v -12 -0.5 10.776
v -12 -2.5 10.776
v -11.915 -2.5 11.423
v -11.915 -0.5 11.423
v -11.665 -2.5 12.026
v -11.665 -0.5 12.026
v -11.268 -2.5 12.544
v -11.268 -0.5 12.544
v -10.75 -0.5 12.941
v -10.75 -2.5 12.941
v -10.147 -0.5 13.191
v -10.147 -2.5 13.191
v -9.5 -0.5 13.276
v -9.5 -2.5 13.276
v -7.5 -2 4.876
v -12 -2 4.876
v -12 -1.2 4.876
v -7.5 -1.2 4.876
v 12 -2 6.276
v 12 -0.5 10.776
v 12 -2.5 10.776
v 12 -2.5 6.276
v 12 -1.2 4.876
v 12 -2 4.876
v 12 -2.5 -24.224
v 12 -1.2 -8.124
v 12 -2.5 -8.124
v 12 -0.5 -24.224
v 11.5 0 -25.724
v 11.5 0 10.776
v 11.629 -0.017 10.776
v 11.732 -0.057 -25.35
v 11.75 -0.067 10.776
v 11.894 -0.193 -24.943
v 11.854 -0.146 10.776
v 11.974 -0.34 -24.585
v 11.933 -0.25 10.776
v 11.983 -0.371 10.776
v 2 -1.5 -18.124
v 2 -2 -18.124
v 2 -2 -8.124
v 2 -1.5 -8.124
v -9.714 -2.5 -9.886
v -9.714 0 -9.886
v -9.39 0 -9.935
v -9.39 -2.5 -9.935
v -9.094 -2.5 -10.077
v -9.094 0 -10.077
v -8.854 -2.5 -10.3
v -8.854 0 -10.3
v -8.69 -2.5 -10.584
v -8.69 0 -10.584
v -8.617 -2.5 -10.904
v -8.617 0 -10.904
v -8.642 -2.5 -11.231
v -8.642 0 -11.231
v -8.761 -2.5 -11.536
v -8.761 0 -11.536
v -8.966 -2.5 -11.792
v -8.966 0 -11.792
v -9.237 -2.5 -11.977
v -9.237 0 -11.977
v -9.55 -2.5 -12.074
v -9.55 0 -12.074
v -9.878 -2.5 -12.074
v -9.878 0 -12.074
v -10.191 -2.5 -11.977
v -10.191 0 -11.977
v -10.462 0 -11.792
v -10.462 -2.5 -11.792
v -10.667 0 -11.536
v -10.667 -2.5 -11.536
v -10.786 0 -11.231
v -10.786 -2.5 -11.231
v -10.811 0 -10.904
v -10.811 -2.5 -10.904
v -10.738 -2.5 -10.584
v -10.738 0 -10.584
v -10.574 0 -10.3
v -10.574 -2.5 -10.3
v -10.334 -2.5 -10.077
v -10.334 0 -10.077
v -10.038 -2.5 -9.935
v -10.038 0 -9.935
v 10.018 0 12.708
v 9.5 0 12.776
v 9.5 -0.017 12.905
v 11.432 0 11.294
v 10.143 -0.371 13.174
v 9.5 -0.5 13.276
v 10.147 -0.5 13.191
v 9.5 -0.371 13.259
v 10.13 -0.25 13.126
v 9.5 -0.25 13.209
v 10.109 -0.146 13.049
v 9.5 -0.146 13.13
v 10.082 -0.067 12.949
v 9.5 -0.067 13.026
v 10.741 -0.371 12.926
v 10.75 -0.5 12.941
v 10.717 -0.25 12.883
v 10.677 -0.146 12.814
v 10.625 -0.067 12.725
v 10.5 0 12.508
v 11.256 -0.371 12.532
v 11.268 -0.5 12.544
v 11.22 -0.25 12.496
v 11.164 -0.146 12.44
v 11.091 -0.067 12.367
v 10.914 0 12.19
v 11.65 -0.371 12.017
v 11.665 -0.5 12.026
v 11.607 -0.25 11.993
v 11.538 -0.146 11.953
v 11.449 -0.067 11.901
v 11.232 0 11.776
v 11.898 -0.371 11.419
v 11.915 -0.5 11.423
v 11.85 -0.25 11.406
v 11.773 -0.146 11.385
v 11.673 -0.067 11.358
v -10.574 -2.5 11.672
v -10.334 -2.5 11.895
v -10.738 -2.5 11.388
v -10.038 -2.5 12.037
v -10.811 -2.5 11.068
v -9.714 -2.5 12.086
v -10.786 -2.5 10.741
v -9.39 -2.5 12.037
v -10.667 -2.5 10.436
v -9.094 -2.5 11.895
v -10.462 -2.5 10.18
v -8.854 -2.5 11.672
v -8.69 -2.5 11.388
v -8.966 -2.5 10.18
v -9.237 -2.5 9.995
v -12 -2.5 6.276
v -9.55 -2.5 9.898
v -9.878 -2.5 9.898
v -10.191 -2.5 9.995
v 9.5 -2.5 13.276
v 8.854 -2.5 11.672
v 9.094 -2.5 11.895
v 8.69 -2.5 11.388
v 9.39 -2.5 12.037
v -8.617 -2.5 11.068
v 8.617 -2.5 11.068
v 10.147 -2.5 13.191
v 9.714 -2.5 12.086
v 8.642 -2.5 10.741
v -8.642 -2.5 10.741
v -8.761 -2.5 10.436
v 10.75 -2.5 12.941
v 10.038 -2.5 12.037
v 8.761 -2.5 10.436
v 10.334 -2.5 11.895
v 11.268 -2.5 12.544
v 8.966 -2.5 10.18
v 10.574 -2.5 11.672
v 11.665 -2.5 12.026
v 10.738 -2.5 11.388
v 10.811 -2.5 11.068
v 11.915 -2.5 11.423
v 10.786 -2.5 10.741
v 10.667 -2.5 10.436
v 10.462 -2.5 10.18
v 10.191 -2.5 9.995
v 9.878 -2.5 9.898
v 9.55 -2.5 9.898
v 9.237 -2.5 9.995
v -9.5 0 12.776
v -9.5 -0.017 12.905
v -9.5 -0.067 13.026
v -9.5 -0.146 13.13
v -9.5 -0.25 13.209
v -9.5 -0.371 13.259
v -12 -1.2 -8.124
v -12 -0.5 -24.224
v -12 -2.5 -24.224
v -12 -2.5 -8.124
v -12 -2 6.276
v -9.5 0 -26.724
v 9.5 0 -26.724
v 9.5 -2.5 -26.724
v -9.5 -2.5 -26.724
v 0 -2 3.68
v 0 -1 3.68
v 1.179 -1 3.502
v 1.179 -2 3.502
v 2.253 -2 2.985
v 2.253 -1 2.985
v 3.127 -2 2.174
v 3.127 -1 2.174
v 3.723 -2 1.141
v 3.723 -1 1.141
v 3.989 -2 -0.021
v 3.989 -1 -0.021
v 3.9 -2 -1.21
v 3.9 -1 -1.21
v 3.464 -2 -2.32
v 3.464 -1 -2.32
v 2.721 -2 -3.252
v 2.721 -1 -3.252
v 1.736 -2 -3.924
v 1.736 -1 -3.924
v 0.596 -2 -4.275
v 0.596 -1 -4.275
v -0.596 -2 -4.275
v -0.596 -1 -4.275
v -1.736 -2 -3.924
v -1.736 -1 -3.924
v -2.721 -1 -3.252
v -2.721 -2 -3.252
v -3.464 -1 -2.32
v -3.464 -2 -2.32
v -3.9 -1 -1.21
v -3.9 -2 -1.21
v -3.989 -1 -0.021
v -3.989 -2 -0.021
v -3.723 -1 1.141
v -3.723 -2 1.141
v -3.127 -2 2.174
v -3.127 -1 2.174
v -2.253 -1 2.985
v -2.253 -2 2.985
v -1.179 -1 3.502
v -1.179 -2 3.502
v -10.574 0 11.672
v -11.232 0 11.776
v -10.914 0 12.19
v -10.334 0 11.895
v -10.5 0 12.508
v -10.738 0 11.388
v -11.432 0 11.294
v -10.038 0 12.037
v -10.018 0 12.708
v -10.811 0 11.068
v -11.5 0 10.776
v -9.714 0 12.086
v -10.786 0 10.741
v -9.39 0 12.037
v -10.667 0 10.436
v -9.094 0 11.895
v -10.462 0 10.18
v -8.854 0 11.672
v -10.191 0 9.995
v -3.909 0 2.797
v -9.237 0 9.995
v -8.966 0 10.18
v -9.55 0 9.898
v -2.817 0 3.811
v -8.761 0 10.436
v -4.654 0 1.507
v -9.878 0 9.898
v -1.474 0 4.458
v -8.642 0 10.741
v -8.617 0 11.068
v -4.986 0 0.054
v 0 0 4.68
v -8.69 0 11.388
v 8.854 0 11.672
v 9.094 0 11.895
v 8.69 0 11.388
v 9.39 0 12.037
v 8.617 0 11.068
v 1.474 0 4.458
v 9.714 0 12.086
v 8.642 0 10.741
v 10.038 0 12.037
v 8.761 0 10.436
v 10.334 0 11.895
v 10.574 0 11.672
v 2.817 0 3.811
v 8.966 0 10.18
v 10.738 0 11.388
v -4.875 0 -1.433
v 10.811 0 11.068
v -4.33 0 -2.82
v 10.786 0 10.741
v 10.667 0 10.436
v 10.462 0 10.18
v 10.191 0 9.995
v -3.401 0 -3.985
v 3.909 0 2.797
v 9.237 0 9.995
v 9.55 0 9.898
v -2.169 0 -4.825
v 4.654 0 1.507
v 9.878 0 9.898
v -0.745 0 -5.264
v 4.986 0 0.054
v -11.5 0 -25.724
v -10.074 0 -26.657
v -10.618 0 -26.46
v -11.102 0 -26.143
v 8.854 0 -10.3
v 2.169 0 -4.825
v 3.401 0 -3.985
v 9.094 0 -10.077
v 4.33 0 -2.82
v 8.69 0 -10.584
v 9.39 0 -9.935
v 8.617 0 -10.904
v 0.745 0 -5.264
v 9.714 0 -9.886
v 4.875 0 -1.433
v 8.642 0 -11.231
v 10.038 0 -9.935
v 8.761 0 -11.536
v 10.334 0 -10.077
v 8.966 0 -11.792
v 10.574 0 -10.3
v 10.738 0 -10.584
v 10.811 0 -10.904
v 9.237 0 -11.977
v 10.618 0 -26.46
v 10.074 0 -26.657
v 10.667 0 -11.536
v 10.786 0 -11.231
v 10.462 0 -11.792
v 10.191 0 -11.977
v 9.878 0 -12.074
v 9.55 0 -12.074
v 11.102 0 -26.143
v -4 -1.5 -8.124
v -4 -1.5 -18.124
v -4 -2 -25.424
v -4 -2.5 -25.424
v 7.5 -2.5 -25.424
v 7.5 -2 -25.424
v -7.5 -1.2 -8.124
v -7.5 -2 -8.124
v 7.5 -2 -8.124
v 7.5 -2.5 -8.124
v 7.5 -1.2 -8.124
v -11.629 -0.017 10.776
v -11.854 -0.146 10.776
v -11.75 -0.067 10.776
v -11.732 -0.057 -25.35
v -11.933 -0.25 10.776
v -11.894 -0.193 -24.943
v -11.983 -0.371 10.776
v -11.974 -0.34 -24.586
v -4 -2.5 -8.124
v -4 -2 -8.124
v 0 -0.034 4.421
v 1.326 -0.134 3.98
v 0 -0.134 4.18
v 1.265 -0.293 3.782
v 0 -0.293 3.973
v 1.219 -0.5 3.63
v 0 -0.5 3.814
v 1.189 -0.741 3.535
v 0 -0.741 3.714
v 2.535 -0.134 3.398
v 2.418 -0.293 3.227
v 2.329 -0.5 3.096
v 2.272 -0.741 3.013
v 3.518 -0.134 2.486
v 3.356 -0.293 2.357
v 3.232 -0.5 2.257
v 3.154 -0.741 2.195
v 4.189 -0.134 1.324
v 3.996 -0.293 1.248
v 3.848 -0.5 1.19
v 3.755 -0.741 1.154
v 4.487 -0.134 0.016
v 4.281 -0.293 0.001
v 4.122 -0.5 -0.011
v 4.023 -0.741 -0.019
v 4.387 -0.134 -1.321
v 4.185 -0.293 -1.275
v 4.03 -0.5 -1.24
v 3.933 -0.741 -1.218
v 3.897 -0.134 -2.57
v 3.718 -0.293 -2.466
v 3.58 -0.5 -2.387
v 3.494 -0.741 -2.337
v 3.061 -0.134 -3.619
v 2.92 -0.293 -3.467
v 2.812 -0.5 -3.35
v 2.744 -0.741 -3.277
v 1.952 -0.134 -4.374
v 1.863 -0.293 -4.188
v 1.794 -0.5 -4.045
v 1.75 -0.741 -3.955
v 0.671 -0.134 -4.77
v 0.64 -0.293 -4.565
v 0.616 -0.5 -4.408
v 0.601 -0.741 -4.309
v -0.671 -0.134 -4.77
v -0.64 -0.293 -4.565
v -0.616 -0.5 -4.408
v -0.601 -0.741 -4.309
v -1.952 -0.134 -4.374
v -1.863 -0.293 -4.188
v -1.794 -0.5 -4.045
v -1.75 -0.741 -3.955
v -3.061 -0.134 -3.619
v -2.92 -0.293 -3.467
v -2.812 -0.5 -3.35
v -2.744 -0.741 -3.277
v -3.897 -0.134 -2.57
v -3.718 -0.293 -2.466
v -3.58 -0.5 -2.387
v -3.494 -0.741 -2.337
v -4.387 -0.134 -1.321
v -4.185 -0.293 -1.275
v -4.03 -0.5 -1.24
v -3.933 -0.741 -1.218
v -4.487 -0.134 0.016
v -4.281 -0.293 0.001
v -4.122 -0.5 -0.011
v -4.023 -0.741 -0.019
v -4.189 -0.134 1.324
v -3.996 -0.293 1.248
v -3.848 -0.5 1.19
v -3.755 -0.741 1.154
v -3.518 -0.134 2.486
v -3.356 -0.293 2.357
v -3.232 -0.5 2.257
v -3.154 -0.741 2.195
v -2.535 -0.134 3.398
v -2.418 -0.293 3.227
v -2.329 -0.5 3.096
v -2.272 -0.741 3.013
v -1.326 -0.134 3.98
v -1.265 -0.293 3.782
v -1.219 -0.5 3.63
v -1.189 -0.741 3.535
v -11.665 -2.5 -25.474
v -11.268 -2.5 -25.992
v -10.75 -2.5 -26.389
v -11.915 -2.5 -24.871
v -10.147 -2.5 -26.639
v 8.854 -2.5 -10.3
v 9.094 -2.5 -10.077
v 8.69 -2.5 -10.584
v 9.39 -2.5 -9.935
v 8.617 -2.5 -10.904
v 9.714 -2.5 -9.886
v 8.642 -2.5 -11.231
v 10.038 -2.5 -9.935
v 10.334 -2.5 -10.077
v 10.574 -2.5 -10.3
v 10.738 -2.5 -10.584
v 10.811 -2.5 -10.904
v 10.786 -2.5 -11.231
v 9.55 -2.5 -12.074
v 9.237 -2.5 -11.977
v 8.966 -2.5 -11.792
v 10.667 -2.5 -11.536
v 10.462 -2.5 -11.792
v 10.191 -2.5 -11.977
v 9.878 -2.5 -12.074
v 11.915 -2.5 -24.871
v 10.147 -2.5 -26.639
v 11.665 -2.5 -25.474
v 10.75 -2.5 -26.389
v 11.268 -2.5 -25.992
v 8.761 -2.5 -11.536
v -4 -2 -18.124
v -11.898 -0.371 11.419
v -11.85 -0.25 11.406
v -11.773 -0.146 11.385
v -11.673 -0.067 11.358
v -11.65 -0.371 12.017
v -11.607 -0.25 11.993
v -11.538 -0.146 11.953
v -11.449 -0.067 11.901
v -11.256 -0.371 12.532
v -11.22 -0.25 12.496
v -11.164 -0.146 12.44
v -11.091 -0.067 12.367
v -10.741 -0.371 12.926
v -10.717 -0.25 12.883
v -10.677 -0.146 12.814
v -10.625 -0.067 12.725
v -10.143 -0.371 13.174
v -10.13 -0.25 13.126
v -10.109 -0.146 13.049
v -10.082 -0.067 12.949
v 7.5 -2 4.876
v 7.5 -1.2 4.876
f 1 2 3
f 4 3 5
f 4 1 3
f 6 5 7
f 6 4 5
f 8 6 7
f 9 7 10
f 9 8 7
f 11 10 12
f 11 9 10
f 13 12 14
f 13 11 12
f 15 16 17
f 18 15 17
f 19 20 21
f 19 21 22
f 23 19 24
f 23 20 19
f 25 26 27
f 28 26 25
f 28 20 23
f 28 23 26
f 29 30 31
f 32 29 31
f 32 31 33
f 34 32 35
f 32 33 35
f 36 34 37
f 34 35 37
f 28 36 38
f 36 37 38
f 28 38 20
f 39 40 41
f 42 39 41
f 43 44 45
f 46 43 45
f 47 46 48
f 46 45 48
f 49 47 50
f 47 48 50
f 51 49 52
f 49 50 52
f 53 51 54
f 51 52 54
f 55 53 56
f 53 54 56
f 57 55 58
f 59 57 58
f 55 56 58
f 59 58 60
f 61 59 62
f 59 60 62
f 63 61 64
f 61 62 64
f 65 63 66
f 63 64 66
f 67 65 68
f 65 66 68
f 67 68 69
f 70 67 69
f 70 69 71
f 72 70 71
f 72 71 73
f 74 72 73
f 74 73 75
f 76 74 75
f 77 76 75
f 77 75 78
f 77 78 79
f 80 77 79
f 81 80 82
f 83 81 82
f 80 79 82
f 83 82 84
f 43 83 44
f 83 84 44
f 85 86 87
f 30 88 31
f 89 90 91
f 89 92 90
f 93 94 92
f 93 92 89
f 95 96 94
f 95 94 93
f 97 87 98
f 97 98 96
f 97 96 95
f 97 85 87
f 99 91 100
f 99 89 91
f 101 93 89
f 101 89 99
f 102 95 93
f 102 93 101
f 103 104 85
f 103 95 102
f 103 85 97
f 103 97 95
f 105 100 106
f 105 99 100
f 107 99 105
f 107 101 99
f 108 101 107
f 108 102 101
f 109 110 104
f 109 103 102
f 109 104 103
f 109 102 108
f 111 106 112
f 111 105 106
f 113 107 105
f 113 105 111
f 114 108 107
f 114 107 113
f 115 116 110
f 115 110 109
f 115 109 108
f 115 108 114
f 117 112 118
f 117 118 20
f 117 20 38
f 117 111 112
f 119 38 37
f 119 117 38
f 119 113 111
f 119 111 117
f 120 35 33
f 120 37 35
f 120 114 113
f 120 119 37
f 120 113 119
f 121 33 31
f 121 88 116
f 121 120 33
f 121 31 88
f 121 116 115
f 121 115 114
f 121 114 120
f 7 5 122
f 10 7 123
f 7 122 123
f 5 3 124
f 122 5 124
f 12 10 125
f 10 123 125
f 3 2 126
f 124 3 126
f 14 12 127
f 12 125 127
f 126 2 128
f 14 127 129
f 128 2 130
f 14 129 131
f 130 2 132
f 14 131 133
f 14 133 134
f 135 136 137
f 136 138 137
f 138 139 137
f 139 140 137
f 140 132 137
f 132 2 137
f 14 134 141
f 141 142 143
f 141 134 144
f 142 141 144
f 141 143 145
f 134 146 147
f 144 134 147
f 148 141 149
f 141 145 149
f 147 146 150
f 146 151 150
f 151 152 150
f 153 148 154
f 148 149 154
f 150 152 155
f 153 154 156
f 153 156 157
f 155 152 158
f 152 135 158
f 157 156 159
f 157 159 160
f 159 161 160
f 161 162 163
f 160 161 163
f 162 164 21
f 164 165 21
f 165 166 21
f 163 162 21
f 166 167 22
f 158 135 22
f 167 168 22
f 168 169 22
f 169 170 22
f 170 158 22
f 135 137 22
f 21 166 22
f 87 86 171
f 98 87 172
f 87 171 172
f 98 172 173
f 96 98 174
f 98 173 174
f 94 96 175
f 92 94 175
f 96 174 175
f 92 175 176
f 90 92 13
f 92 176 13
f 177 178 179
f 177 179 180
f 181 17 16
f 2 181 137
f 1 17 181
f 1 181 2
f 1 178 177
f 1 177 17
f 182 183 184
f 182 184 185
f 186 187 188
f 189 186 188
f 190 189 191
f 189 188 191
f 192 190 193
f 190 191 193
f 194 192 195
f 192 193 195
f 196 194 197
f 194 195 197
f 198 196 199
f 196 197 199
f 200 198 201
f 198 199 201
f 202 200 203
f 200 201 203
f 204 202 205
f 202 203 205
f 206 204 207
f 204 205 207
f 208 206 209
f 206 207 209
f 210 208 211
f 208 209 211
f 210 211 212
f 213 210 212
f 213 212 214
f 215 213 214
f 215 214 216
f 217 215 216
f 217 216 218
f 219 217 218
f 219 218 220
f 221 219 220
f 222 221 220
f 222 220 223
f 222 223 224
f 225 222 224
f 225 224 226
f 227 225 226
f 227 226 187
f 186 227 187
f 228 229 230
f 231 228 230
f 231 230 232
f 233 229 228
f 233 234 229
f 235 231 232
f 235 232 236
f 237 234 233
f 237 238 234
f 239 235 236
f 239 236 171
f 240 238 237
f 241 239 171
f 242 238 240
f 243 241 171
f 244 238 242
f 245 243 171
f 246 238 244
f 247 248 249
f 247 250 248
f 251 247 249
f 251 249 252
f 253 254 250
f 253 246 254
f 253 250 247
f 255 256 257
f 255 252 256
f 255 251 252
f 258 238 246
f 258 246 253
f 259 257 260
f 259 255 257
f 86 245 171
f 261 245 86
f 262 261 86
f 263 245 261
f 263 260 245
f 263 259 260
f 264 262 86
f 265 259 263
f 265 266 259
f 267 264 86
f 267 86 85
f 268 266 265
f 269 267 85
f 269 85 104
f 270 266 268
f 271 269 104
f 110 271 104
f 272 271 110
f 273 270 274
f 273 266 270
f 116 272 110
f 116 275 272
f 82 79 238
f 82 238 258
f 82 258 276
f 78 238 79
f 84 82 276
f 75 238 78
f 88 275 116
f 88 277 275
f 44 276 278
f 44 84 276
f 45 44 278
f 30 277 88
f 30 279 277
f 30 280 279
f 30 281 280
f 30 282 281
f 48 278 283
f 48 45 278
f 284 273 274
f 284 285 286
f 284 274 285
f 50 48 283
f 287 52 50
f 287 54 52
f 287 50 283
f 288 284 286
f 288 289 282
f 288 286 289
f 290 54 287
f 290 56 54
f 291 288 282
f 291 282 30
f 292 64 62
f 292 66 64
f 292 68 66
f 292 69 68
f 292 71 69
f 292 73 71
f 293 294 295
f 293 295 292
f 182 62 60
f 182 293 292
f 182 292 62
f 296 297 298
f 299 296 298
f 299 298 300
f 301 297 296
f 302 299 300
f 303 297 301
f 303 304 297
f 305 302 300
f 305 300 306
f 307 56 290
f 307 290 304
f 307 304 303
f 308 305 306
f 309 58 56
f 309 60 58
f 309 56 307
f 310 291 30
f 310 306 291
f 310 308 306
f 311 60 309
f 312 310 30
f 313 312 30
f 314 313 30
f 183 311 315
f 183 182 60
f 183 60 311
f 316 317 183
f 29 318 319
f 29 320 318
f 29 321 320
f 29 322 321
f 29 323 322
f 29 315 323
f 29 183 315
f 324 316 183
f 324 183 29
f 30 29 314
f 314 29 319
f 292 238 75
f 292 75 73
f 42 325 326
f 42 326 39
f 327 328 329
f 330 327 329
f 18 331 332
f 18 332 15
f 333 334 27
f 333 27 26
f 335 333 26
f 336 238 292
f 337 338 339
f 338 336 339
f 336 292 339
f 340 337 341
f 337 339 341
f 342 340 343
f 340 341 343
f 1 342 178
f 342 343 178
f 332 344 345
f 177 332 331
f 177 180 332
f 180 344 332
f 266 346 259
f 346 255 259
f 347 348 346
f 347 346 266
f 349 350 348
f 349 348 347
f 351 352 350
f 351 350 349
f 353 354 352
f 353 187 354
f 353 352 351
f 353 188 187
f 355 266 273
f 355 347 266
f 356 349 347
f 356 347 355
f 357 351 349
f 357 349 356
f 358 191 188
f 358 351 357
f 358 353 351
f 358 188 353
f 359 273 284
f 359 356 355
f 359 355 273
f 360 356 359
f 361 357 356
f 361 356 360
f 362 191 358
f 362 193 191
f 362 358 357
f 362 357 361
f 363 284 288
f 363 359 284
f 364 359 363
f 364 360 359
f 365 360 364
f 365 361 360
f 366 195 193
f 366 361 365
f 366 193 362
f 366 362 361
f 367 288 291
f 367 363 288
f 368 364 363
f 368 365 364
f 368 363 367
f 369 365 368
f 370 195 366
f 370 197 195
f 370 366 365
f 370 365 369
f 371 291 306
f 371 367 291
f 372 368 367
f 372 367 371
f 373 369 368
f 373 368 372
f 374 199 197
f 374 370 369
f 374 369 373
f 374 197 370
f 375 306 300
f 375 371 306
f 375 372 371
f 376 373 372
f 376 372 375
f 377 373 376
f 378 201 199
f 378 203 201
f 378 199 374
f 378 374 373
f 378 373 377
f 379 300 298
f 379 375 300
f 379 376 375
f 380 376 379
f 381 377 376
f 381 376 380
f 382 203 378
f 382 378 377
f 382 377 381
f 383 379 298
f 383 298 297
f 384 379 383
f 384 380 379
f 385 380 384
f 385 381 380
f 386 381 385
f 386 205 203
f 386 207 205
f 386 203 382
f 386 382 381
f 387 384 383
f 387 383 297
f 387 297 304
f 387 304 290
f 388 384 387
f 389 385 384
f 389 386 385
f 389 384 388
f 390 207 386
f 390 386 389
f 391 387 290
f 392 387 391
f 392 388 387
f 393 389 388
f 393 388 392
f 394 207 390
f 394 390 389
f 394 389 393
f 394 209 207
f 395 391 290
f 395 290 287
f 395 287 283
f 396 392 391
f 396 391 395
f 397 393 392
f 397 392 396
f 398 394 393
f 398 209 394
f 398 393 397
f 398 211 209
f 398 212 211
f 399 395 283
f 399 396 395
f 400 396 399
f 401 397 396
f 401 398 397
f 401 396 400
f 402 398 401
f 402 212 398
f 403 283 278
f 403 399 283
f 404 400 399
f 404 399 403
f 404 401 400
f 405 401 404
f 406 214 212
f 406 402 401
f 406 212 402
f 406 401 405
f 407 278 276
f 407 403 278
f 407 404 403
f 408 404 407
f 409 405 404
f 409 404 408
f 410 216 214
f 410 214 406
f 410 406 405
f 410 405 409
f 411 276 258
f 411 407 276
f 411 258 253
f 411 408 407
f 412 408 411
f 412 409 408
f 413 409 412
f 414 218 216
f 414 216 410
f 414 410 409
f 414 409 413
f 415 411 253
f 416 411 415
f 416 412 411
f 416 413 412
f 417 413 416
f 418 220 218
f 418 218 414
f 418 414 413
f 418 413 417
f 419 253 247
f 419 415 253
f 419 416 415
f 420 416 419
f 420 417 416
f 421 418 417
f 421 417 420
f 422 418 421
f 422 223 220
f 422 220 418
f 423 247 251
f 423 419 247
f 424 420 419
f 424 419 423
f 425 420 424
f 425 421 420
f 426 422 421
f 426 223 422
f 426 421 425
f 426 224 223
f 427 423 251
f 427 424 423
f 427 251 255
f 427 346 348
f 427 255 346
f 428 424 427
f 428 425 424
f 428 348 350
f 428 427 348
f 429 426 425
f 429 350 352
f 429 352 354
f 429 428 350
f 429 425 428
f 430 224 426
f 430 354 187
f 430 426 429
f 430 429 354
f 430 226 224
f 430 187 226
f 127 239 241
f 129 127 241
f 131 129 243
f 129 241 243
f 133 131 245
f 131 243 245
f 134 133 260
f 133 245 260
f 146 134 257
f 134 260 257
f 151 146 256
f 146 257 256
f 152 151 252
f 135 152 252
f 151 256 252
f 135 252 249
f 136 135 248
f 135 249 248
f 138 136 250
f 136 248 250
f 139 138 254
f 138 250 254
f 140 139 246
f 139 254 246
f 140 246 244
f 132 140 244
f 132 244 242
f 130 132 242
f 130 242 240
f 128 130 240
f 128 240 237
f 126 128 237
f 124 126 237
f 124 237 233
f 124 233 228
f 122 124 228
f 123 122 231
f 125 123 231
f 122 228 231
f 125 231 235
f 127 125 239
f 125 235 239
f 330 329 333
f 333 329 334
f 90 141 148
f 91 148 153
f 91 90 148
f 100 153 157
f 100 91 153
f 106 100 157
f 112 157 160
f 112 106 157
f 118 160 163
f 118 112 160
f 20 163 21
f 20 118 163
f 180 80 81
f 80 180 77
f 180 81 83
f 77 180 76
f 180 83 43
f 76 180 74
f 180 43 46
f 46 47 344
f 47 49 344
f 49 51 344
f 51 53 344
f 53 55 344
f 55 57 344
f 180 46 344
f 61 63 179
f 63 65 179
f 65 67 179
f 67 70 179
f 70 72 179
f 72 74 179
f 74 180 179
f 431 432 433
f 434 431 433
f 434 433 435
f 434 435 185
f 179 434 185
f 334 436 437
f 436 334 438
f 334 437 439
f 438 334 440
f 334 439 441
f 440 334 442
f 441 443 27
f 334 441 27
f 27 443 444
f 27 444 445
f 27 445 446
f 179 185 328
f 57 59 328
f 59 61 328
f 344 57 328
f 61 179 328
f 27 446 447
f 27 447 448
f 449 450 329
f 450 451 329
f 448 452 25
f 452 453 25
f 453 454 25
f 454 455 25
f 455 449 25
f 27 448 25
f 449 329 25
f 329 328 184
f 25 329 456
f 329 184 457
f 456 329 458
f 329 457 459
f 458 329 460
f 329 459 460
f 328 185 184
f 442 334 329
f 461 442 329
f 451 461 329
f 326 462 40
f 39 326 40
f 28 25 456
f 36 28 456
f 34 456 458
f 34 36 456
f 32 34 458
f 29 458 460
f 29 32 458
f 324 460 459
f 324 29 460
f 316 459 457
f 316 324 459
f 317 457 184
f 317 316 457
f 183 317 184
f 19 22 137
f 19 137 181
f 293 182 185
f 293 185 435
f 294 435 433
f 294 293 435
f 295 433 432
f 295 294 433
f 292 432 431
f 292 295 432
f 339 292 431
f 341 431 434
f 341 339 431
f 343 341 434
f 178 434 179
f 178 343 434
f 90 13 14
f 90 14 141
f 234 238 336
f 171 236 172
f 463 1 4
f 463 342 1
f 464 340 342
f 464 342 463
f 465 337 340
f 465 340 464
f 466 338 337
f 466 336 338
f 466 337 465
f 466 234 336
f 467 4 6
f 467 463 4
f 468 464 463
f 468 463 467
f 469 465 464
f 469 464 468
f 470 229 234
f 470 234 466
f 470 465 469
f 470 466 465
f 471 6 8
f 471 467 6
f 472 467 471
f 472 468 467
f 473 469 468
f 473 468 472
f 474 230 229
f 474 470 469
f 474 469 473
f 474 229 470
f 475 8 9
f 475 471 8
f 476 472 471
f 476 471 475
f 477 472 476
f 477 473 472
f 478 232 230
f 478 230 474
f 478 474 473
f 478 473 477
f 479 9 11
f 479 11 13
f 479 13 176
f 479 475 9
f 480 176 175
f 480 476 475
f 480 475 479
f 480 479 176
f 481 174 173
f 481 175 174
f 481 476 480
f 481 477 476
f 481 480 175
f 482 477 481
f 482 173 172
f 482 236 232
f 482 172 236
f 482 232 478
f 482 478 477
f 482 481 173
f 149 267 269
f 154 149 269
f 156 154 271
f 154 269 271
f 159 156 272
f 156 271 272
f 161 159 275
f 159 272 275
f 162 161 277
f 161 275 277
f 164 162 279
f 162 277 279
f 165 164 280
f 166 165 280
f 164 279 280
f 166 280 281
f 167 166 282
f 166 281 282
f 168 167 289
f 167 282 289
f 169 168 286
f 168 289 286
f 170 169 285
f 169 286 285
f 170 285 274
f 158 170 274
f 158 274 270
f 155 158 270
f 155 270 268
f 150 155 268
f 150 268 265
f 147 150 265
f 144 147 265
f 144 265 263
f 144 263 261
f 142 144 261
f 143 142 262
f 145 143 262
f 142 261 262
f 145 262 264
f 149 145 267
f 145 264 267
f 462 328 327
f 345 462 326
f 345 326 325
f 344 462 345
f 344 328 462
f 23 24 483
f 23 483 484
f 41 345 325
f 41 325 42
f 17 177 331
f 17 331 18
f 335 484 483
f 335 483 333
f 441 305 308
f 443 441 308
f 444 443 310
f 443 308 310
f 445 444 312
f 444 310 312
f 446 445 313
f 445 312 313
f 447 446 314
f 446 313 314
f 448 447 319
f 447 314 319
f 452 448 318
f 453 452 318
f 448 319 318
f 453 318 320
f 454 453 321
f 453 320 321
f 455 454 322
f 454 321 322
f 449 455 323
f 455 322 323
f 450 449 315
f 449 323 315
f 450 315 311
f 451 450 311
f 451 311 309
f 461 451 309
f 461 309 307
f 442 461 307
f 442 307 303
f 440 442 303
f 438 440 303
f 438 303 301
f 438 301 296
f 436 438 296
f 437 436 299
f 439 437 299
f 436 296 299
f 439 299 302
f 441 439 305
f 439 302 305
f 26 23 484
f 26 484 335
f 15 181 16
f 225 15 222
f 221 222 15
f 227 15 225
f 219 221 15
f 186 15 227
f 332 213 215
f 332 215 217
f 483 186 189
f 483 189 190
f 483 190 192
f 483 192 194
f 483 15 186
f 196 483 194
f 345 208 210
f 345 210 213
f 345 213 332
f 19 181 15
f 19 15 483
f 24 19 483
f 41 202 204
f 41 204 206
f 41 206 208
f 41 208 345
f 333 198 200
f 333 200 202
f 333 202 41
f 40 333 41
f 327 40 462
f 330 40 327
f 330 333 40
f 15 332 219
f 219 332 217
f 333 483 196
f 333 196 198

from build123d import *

# Parameters (mm, degrees)
SKETCH_1_R           = 1.1
SKETCH_1_R_2         = 4
EXTRUDE_1_DEPTH      = 2.5
SKETCH_2_W           = 14.4
SKETCH_2_H           = 0.5
CUT_EXTRUDE_1_DEPTH  = 37.005863078
SKETCH_3_W           = 13
SKETCH_3_H           = 1.3
CUT_EXTRUDE_2_DEPTH  = 4.5
SKETCH_4_W           = 13
SKETCH_4_H           = 1.3
CUT_EXTRUDE_3_DEPTH  = 4.5
SKETCH_5_W           = 11.5
SKETCH_5_H           = 17.3
CUT_EXTRUDE_11_DEPTH = 0.5
SKETCH_6_W           = 6
SKETCH_6_H           = 10
CUT_EXTRUDE_12_DEPTH = 0.5
FILLET_1_R           = 0.5
FILLET_2_R           = 1


with BuildPart() as part:
    # 草图1 → 凸台-拉伸1 (new body)
    with BuildSketch(Plane(origin=(0, 0, 0), x_dir=(1, 0, 0), z_dir=(0, 1, 0))):
        with BuildLine():
            Line((-12, 24.224), (-12, -10.776))
            ThreePointArc((-12, -10.776), (-11.267766953, -12.543766953), (-9.5, -13.276))
            Line((-9.5, -13.276), (9.5, -13.276))
            ThreePointArc((9.5, -13.276), (11.267766953, -12.543766953), (12, -10.776))
            Line((12, -10.776), (12, 24.224))
            ThreePointArc((12, 24.224), (11.267766953, 25.991766953), (9.5, 26.724))
            Line((9.5, 26.724), (-9.5, 26.724))
            ThreePointArc((-9.5, 26.724), (-11.267766953, 25.991766953), (-12, 24.224))
        make_face()
        with Locations(Location((-9.714, -10.986, 0), (0, 0, 270))):
            Circle(SKETCH_1_R, mode=Mode.SUBTRACT)
        with Locations(Location((0, 0.32, 0), (0, 0, 270))):
            Circle(SKETCH_1_R_2, mode=Mode.SUBTRACT)
        with Locations(Location((9.714, -10.986, 0), (0, 0, 270))):
            Circle(SKETCH_1_R, mode=Mode.SUBTRACT)
        with Locations(Location((9.714, 10.986, 0), (0, 0, 270))):
            Circle(SKETCH_1_R, mode=Mode.SUBTRACT)
        with Locations(Location((-9.714, 10.986, 0), (0, 0, 270))):
            Circle(SKETCH_1_R, mode=Mode.SUBTRACT)
    extrude(amount=-EXTRUDE_1_DEPTH)

    # 草图2 → 切除-拉伸1 (cut, through all)
    with BuildSketch(Plane(origin=(12, 0, 0), x_dir=(0, 0, -1), z_dir=(1, 0, 0))):
        with Locations((0.924, -2.25)):
            Rectangle(SKETCH_2_W, SKETCH_2_H)
    extrude(amount=-CUT_EXTRUDE_1_DEPTH, mode=Mode.SUBTRACT)

    # 草图3 → 切除-拉伸2 (cut)
    with BuildSketch(Plane(origin=(12, 0, 0), x_dir=(0, 0, -1), z_dir=(1, 0, 0))):
        with Locations((1.624, -1.85)):
            Rectangle(SKETCH_3_W, SKETCH_3_H)
    extrude(amount=-CUT_EXTRUDE_2_DEPTH, mode=Mode.SUBTRACT)

    # 草图4 → 切除-拉伸3 (cut)
    with BuildSketch(Plane.ZY.offset(12)):
        with Locations((-1.624, -1.85)):
            Rectangle(SKETCH_4_W, SKETCH_4_H)
    extrude(amount=-CUT_EXTRUDE_3_DEPTH, mode=Mode.SUBTRACT)

    # 草图5 → 切除-拉伸11 (cut)
    with BuildSketch(Plane.XZ.offset(2.5)):
        with Locations((1.75, -16.774)):
            Rectangle(SKETCH_5_W, SKETCH_5_H)
    extrude(amount=-CUT_EXTRUDE_11_DEPTH, mode=Mode.SUBTRACT)

    # 草图6 → 切除-拉伸12 (cut)
    with BuildSketch(Plane.XZ.offset(2)):
        with Locations((-1, -13.124)):
            Rectangle(SKETCH_6_W, SKETCH_6_H)
    extrude(amount=-CUT_EXTRUDE_12_DEPTH, mode=Mode.SUBTRACT)

    # 圆角1
    # the kernel refuses this fillet: 0.5 mm, written as the material it takes off along each edge
    with BuildSketch(Plane(origin=(-9.5, 0, 13.276), x_dir=(0, 0, -1), z_dir=(1, 0, 0))) as fillet_1_piece_1:
        with BuildLine():
            CenterArc((FILLET_1_R, -FILLET_1_R), FILLET_1_R, 90, 90)
            Line((0, -FILLET_1_R), (-FILLET_1_R * 0.02, -FILLET_1_R))
            Line((-FILLET_1_R * 0.02, -FILLET_1_R), (-FILLET_1_R * 0.02, FILLET_1_R * 0.02))
            Line((-FILLET_1_R * 0.02, FILLET_1_R * 0.02), (FILLET_1_R, FILLET_1_R * 0.02))
            Line((FILLET_1_R, FILLET_1_R * 0.02), (FILLET_1_R, 0))
        make_face()
    extrude(amount=19, mode=Mode.SUBTRACT)
    with BuildSketch(Plane(origin=(-9.5, 0, 10.776), x_dir=(-1, 0, 0), z_dir=(0, 0, -1))) as fillet_1_piece_2:
        with BuildLine():
            CenterArc((2.5 - FILLET_1_R, -FILLET_1_R), FILLET_1_R, 0, 90)
            Line((2.5, -FILLET_1_R), (2.5 + FILLET_1_R * 0.02, -FILLET_1_R))
            Line((2.5 + FILLET_1_R * 0.02, -FILLET_1_R), (2.5 + FILLET_1_R * 0.02, FILLET_1_R * 0.02))
            Line((2.5 + FILLET_1_R * 0.02, FILLET_1_R * 0.02), (2.5 - FILLET_1_R, FILLET_1_R * 0.02))
            Line((2.5 - FILLET_1_R, FILLET_1_R * 0.02), (2.5 - FILLET_1_R, 0))
        make_face()
    revolve(axis=Axis((-9.5, 0, 10.776), (0, 1, 0)), revolution_arc=90, mode=Mode.SUBTRACT)
    with BuildSketch(Plane(origin=(-12, 0, -27.224), x_dir=(0, -1, 0), z_dir=(0, 0, 1))) as fillet_1_piece_3:
        with BuildLine():
            CenterArc((FILLET_1_R, FILLET_1_R), FILLET_1_R, 180, 90)
            Line((0, FILLET_1_R), (-FILLET_1_R * 0.02, FILLET_1_R))
            Line((-FILLET_1_R * 0.02, FILLET_1_R), (-FILLET_1_R * 0.02, -FILLET_1_R * 0.02))
            Line((-FILLET_1_R * 0.02, -FILLET_1_R * 0.02), (FILLET_1_R, -FILLET_1_R * 0.02))
            Line((FILLET_1_R, -FILLET_1_R * 0.02), (FILLET_1_R, 0))
        make_face()
    extrude(amount=38, mode=Mode.SUBTRACT)
    with BuildSketch(Plane(origin=(12, 0, 10.776), x_dir=(-1, 0, 0), z_dir=(0, 0, -1))) as fillet_1_piece_4:
        with BuildLine():
            CenterArc((FILLET_1_R, -FILLET_1_R), FILLET_1_R, 90, 90)
            Line((0, -FILLET_1_R), (-FILLET_1_R * 0.02, -FILLET_1_R))
            Line((-FILLET_1_R * 0.02, -FILLET_1_R), (-FILLET_1_R * 0.02, FILLET_1_R * 0.02))
            Line((-FILLET_1_R * 0.02, FILLET_1_R * 0.02), (FILLET_1_R, FILLET_1_R * 0.02))
            Line((FILLET_1_R, FILLET_1_R * 0.02), (FILLET_1_R, 0))
        make_face()
    extrude(amount=38, mode=Mode.SUBTRACT)
    with BuildSketch(Plane(origin=(9.5, 0, 10.776), x_dir=(0, 0, 1), z_dir=(-1, 0, 0))) as fillet_1_piece_5:
        with BuildLine():
            CenterArc((2.5 - FILLET_1_R, -FILLET_1_R), FILLET_1_R, 0, 90)
            Line((2.5, -FILLET_1_R), (2.5 + FILLET_1_R * 0.02, -FILLET_1_R))
            Line((2.5 + FILLET_1_R * 0.02, -FILLET_1_R), (2.5 + FILLET_1_R * 0.02, FILLET_1_R * 0.02))
            Line((2.5 + FILLET_1_R * 0.02, FILLET_1_R * 0.02), (2.5 - FILLET_1_R, FILLET_1_R * 0.02))
            Line((2.5 - FILLET_1_R, FILLET_1_R * 0.02), (2.5 - FILLET_1_R, 0))
        make_face()
    revolve(axis=Axis((9.5, 0, 10.776), (0, 1, 0)), revolution_arc=90, mode=Mode.SUBTRACT)

    # 圆角2
    fillet_2_edges = [part.edges().sort_by_distance(p)[0] for p in [
        (0, 0, -4.32),
    ]]
    fillet(fillet_2_edges, radius=FILLET_2_R)


solid = part.part
